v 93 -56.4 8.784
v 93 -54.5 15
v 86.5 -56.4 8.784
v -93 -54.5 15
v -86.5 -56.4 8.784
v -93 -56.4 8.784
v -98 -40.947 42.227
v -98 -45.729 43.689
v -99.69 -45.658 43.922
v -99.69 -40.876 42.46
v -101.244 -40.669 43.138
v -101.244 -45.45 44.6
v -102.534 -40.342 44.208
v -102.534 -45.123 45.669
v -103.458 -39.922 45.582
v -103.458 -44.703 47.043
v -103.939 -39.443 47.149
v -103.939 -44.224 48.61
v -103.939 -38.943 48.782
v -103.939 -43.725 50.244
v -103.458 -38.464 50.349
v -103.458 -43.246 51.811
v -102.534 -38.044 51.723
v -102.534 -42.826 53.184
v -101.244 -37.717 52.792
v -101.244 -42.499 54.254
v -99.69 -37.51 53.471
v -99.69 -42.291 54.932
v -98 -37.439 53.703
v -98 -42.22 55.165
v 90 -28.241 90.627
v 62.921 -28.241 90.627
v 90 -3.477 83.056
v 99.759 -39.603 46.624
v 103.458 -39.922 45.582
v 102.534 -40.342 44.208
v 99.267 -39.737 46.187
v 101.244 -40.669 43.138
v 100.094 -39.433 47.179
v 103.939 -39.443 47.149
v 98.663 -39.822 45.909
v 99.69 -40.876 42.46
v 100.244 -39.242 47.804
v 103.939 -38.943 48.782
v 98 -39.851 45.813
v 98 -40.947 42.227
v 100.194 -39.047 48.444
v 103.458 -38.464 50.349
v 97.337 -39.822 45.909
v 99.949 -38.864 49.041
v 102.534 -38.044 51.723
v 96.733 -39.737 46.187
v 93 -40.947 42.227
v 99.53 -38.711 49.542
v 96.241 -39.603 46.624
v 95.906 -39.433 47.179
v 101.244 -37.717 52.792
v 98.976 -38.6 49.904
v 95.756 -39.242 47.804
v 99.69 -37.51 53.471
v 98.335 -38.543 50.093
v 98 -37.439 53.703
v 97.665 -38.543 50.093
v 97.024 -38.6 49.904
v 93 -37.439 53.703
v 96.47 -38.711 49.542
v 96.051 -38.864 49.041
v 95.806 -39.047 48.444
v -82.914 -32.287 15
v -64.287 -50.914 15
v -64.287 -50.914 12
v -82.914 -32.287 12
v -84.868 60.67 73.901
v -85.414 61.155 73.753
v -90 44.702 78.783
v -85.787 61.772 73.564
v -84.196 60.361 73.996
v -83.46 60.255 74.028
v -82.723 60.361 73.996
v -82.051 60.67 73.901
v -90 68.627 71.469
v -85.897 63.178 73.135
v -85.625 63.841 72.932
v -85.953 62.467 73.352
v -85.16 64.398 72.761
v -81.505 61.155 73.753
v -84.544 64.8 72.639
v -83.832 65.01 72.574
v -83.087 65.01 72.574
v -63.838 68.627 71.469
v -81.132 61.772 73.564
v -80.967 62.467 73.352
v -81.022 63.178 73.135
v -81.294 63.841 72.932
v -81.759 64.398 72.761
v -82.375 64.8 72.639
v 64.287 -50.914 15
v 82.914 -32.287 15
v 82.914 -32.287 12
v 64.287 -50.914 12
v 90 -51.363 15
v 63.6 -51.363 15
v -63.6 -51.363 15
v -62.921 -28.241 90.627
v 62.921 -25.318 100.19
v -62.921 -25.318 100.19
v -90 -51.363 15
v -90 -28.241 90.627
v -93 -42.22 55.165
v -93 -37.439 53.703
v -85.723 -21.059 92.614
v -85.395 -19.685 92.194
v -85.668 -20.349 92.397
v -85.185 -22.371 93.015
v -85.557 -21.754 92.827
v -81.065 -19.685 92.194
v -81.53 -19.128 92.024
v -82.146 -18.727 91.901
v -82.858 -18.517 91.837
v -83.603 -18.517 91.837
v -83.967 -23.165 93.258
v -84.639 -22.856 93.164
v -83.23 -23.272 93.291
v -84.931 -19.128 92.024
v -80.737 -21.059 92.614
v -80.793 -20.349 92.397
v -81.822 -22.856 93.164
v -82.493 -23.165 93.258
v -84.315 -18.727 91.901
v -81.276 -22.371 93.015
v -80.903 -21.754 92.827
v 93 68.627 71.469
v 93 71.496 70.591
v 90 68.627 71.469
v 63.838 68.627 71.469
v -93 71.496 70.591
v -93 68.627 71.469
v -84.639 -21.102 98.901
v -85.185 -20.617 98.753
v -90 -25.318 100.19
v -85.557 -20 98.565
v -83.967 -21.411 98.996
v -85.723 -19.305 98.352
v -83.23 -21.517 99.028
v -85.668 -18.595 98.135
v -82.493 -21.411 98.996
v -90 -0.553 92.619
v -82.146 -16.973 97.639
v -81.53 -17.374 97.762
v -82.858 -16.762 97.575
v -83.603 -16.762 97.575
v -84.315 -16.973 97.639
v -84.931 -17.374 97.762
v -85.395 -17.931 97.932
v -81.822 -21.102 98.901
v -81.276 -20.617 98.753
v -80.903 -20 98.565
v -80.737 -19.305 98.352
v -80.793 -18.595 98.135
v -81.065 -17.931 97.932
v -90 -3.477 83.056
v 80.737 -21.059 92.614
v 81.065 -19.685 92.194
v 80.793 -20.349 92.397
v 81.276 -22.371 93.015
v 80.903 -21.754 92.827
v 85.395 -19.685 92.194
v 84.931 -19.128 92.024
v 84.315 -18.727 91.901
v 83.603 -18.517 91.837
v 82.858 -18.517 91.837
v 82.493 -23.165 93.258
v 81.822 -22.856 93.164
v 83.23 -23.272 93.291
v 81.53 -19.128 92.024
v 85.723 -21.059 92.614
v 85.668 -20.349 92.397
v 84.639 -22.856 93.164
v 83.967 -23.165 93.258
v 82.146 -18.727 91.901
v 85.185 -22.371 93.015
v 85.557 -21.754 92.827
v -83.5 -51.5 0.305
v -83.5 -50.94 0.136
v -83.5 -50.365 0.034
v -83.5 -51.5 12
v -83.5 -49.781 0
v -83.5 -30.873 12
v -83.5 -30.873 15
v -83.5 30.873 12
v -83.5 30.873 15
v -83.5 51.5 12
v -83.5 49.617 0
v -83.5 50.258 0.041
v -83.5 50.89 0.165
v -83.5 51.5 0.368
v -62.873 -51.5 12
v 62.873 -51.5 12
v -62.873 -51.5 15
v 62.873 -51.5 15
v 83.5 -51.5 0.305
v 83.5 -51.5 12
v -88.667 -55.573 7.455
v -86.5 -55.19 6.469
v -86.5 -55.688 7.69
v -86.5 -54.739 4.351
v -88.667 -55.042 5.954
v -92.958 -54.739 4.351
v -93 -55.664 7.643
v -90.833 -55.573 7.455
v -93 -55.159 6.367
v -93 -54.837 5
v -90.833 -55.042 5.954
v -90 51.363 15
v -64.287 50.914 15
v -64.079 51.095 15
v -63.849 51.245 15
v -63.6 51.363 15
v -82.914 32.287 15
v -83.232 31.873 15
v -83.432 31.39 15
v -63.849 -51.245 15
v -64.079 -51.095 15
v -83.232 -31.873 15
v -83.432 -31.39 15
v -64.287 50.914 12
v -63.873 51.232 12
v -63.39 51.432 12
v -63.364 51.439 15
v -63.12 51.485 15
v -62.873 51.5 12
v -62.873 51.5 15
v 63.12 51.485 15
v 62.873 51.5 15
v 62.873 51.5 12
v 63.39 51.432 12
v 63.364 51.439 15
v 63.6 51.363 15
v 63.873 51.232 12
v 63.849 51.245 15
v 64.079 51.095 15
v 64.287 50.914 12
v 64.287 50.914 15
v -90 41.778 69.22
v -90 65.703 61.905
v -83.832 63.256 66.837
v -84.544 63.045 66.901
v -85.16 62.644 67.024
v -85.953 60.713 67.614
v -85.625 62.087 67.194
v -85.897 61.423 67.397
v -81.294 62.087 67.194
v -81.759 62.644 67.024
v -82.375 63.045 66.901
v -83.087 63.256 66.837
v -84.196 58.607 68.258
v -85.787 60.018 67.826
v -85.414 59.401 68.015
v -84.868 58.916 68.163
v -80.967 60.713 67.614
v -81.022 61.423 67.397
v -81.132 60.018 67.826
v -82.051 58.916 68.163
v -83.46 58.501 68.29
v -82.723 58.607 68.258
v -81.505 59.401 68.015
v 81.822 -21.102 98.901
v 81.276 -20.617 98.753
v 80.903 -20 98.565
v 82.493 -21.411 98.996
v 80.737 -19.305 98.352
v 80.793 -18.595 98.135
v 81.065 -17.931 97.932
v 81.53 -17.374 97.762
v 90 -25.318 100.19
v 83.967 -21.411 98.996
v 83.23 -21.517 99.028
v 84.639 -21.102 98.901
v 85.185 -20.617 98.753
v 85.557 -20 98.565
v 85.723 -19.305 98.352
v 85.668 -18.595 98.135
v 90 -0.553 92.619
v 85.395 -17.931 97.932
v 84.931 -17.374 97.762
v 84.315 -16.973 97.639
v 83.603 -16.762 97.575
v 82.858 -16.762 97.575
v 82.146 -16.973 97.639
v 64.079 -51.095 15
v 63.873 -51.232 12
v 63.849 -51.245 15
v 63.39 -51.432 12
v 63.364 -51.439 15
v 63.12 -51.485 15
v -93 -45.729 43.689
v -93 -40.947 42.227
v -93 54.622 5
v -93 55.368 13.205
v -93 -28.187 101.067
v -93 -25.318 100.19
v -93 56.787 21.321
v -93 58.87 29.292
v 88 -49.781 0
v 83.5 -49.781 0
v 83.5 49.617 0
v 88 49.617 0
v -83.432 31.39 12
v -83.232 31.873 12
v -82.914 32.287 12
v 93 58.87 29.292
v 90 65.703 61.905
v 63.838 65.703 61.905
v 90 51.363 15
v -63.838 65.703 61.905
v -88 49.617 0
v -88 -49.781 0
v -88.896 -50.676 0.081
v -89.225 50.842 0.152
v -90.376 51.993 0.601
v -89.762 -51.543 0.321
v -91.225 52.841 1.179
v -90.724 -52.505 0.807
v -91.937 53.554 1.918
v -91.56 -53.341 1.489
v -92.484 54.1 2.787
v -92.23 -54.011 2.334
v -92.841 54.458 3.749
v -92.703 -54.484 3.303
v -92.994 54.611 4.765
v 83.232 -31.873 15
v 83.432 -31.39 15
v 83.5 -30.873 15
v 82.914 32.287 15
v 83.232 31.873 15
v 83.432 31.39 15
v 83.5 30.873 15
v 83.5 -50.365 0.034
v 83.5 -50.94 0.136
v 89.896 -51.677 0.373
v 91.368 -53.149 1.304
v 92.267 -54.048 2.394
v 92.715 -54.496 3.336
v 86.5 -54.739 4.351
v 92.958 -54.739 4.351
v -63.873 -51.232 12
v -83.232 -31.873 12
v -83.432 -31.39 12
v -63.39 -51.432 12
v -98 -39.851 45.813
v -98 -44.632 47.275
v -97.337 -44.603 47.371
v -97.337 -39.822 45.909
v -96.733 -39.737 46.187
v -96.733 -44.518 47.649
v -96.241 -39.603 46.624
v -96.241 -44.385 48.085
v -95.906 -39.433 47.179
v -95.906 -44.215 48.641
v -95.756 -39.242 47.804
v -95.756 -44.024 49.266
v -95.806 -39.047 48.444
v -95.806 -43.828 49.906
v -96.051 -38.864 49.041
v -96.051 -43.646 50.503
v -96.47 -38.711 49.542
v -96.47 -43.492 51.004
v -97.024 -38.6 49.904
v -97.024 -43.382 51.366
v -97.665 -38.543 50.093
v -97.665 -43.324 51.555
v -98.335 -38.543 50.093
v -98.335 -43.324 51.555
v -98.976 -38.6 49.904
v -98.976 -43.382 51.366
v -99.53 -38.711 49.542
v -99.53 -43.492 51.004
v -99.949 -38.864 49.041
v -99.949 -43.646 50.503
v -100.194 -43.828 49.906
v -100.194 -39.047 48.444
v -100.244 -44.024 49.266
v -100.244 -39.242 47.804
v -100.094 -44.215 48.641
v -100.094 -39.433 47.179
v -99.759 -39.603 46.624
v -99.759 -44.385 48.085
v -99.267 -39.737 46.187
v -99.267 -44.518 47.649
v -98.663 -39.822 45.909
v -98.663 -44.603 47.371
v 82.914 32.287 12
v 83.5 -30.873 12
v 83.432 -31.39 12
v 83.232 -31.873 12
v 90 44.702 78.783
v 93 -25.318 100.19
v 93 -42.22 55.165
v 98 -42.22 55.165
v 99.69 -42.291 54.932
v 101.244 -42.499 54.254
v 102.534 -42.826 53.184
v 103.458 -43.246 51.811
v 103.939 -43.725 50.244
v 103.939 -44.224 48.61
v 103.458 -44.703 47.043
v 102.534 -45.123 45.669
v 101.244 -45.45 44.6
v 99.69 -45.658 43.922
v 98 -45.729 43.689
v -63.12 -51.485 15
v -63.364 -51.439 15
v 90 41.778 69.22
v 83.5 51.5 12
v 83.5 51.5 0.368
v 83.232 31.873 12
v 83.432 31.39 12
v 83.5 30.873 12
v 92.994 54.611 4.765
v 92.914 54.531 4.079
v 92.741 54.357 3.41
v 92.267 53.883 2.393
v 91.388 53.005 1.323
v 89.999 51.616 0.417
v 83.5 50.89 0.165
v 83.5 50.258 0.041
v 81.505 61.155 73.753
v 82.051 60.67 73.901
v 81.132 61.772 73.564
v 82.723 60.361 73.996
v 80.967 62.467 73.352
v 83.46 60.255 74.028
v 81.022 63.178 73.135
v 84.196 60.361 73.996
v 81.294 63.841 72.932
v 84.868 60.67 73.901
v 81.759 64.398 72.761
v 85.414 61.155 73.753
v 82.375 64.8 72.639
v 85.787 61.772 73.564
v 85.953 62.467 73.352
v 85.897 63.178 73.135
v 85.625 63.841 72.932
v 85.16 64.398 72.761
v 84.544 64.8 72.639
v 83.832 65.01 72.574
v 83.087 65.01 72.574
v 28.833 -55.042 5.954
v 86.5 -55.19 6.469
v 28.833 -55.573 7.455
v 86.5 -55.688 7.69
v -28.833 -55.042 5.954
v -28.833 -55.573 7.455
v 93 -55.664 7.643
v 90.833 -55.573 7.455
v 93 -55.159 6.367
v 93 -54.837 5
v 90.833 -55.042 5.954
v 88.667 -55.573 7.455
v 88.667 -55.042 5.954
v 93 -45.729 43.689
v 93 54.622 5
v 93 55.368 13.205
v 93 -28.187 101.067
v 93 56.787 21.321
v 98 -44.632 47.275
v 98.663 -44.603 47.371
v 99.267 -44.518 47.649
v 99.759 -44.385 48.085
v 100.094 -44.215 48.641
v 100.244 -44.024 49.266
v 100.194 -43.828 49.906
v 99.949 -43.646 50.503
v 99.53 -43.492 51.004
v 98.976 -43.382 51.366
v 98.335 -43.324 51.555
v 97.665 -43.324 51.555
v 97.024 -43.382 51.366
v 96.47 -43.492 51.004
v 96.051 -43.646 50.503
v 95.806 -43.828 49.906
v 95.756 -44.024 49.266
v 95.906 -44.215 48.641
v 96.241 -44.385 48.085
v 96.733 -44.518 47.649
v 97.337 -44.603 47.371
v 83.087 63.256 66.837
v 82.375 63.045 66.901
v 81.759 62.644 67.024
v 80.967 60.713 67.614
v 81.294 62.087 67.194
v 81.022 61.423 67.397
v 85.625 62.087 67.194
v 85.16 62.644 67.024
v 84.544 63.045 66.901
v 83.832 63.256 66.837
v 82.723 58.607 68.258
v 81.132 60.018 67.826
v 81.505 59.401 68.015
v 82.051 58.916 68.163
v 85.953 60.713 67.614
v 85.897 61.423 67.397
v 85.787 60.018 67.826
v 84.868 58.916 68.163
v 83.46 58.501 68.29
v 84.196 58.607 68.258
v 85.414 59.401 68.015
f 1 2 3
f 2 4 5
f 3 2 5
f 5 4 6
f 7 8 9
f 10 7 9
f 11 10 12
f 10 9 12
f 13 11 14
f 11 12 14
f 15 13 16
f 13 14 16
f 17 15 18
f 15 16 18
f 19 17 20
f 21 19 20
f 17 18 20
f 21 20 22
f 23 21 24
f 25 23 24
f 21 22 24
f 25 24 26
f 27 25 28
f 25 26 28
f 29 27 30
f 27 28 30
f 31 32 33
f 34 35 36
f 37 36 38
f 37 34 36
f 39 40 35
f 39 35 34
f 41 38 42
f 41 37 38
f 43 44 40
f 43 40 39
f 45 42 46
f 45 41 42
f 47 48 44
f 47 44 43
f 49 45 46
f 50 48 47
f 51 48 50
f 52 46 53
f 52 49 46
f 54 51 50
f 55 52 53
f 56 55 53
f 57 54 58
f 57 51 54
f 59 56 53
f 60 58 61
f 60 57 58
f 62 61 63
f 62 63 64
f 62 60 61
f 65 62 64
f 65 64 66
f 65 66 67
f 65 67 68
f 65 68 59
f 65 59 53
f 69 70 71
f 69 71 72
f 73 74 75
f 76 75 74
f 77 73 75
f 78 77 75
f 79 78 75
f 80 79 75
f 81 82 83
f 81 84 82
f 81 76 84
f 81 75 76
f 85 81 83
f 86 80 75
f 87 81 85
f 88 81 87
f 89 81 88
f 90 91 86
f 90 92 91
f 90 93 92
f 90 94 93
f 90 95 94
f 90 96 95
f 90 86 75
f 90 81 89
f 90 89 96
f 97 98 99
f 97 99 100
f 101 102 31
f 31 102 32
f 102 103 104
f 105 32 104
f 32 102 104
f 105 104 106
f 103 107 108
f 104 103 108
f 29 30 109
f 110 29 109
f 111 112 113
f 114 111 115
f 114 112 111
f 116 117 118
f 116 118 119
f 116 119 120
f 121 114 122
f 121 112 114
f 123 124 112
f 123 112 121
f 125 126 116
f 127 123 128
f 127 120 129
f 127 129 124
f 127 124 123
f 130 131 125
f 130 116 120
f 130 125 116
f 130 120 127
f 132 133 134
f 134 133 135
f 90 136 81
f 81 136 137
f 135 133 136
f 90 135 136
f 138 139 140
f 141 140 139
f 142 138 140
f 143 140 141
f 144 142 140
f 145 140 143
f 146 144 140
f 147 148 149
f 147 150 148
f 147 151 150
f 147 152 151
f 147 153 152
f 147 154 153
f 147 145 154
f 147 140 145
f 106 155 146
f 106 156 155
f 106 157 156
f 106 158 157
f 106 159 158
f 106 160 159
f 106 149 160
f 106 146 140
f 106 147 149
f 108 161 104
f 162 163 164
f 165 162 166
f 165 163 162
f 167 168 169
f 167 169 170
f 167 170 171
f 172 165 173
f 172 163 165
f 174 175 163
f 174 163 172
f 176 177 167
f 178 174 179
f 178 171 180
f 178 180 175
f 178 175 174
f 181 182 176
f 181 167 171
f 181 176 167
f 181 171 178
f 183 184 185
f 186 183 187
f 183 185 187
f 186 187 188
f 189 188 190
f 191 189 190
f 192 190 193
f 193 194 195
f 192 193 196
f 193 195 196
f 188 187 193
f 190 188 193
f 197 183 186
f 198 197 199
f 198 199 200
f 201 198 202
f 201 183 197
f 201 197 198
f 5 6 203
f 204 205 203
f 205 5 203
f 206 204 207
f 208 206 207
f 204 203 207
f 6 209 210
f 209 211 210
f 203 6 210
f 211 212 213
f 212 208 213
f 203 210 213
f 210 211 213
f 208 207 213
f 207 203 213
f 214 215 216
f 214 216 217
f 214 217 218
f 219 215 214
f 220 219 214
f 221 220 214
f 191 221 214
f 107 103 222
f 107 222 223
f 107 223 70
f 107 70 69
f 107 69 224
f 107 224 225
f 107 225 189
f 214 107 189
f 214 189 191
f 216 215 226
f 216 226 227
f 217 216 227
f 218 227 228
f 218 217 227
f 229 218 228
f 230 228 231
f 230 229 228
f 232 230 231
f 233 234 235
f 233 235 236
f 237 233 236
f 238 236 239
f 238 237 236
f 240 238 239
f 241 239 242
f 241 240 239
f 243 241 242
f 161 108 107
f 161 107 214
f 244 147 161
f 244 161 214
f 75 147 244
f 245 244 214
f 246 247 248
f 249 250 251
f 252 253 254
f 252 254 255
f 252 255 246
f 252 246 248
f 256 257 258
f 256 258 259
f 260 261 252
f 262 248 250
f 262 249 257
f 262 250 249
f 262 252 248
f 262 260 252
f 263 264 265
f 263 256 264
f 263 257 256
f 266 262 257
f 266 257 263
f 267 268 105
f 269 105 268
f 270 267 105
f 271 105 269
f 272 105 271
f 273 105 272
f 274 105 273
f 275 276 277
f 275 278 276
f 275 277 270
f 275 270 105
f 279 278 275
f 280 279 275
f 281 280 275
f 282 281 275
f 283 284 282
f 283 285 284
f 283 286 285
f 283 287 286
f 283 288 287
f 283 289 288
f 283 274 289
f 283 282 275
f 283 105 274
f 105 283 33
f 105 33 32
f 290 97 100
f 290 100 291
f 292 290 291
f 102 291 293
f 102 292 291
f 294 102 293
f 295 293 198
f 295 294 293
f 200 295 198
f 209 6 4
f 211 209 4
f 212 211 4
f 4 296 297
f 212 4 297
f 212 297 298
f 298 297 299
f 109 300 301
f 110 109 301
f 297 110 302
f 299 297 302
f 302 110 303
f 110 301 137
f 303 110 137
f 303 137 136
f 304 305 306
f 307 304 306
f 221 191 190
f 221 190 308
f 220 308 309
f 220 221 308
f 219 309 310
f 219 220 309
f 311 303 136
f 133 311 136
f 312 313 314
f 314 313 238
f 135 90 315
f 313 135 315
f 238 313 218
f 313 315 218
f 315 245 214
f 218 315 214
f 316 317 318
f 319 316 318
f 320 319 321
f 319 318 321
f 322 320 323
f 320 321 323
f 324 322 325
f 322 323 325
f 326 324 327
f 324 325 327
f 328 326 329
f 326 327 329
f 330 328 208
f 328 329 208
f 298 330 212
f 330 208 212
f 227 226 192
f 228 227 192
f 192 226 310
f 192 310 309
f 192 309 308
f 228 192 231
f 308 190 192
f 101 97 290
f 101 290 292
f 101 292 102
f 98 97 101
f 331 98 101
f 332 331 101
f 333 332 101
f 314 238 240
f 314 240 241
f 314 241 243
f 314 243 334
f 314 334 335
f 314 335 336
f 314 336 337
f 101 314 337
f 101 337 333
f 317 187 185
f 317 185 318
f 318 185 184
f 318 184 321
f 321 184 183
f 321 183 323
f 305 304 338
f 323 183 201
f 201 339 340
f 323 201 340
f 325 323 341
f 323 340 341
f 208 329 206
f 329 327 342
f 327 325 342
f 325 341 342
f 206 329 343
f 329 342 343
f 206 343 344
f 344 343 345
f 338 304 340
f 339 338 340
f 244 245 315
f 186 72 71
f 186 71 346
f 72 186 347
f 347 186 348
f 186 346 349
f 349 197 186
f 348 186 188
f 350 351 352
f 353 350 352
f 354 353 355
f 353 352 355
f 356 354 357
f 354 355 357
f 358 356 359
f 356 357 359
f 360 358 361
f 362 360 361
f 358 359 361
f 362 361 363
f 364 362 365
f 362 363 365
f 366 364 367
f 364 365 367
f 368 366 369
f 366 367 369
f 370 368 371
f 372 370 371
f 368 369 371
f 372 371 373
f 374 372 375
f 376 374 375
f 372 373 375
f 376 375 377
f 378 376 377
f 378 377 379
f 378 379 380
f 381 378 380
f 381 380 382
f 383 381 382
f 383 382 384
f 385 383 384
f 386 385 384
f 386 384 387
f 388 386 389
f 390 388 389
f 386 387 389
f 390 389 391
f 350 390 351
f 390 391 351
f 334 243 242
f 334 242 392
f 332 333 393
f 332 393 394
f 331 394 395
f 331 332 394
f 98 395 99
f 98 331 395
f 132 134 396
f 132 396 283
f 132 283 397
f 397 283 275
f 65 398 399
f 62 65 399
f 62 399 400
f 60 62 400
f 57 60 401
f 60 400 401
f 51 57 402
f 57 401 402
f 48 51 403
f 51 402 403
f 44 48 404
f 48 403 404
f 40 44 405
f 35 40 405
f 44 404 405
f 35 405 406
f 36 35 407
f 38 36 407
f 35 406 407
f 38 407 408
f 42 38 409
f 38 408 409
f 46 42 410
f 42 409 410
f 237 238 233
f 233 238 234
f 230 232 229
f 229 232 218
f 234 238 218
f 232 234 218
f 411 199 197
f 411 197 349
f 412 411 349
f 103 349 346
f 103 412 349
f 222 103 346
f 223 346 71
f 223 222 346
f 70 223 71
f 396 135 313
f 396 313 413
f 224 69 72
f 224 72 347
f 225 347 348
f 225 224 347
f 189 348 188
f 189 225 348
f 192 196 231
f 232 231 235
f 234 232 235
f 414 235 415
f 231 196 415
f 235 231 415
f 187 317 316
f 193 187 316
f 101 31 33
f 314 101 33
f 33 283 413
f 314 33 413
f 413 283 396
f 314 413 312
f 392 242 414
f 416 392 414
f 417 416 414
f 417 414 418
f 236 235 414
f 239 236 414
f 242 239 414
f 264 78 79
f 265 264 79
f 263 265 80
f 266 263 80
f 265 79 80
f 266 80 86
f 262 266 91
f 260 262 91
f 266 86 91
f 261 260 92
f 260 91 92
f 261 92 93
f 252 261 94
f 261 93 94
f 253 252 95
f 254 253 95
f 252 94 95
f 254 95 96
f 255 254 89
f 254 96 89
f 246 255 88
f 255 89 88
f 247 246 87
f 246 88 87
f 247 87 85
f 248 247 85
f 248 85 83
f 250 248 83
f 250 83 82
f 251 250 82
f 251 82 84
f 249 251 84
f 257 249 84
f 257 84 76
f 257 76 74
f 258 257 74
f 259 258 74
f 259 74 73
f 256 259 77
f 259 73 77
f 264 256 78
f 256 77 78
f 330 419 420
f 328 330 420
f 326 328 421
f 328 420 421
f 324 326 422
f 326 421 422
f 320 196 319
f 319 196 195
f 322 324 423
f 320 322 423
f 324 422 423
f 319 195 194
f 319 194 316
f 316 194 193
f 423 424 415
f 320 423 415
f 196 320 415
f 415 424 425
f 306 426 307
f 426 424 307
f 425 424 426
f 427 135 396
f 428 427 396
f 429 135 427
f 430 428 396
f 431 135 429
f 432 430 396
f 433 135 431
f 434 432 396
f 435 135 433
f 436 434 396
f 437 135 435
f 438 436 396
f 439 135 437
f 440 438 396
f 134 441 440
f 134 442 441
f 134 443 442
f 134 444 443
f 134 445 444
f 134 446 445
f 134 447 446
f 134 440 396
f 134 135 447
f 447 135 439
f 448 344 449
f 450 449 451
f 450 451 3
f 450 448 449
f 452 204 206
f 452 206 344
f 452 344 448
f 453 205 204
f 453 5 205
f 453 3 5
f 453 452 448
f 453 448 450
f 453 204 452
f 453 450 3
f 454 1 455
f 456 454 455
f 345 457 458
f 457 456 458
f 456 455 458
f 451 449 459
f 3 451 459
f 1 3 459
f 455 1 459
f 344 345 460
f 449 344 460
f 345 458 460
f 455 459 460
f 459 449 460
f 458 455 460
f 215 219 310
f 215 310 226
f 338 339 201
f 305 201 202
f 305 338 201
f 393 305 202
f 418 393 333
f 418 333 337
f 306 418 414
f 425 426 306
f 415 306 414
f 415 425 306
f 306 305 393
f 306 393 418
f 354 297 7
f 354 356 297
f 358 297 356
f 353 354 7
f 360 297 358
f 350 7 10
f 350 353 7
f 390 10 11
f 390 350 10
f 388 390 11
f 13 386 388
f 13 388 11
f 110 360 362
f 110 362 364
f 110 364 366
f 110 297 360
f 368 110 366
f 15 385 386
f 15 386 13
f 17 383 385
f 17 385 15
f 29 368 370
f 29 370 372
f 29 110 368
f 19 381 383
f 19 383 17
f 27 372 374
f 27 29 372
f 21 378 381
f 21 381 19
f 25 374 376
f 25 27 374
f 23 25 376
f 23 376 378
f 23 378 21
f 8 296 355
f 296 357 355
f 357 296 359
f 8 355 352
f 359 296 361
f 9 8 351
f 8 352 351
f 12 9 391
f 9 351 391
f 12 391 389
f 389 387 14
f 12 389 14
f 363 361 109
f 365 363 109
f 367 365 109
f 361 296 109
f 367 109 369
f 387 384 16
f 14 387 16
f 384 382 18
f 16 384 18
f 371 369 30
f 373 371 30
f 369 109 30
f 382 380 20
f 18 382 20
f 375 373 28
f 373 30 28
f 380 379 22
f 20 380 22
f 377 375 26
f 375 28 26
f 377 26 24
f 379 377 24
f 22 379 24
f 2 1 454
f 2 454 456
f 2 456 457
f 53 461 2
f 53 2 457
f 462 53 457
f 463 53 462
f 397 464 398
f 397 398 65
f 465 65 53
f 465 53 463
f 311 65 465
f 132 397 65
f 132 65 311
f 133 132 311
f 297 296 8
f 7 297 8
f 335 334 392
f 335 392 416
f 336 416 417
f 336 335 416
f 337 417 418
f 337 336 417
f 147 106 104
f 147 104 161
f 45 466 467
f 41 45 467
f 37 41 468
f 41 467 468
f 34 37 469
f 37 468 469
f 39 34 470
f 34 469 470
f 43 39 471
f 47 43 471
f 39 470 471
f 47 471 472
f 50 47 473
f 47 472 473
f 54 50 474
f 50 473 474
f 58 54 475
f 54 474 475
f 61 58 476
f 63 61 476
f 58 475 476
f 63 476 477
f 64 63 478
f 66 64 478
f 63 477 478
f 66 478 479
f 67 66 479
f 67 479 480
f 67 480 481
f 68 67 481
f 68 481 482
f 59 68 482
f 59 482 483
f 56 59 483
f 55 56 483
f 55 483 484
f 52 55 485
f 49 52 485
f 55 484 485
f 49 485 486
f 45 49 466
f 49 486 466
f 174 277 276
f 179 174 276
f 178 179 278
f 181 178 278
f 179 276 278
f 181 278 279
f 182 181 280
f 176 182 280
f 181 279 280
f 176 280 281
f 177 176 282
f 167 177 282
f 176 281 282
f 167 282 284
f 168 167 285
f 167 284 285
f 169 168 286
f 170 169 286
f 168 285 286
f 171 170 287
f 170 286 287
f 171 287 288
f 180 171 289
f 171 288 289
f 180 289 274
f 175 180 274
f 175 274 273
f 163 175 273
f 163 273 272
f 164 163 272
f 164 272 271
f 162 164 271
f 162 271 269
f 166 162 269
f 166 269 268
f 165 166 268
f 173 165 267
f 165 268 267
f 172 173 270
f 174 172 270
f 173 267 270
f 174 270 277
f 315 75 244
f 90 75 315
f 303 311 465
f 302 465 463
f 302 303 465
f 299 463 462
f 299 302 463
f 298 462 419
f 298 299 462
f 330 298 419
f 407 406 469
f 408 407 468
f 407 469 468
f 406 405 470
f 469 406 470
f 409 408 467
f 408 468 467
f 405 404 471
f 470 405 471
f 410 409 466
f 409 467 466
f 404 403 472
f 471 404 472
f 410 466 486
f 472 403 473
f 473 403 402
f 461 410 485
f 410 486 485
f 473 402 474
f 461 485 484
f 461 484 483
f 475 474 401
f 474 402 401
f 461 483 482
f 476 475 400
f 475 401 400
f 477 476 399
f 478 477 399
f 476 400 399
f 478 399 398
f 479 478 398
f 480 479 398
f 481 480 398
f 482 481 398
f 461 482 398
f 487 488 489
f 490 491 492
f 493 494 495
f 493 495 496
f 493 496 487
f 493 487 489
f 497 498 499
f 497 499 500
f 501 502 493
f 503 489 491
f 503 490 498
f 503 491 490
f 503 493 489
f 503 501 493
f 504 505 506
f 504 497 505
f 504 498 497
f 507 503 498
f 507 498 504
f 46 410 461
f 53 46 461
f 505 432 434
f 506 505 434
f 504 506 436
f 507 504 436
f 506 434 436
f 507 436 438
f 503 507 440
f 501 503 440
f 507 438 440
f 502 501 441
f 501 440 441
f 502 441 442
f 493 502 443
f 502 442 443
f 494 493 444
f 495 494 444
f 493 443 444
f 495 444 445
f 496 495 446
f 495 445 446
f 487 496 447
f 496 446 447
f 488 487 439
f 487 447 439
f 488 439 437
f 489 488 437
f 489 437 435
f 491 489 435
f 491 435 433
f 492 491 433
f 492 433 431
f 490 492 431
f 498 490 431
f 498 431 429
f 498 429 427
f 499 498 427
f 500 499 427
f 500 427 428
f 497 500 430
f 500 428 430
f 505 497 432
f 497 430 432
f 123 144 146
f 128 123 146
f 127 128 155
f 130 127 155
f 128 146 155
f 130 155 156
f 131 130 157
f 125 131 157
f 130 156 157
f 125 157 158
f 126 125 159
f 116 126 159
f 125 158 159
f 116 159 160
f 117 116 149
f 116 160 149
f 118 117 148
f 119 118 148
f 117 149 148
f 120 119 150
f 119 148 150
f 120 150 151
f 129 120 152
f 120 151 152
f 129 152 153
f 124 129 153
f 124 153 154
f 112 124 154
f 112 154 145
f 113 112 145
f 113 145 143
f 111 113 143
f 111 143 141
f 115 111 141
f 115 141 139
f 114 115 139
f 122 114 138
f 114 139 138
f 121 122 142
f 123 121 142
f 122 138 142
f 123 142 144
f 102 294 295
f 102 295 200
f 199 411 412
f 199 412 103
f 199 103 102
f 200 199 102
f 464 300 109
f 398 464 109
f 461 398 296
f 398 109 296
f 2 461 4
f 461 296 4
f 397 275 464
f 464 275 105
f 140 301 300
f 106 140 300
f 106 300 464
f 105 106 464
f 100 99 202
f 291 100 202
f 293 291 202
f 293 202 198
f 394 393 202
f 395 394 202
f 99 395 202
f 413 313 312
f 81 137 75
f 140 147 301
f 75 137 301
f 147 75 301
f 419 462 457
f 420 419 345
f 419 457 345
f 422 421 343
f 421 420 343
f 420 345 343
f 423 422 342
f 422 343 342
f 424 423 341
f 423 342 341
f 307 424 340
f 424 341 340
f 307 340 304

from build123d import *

# Parameters (mm, degrees)
SKETCH1_W                = 173
SKETCH1_H                = 109
SKETCH1_W_2              = 167
SKETCH1_H_2              = 103
EXTRUDE_THIN1_DEPTH      = 15
BOSS_EXTRUDE1_DEPTH      = 3
BOSS_EXTRUDE2_DEPTH      = 86.5
BOSS_EXTRUDE2_DEPTH_BACK = 86.5
MOVE_START               = 86.5
MOVE_FACE1_DEPTH         = 6.5
MOVE_START_2             = -93
MOVE_FACE2_DEPTH         = 6.5
BOSS_EXTRUDE3_START      = -93
BOSS_EXTRUDE3_DEPTH      = 186
BOSS_EXTRUDE3_2_DEPTH    = 3
BOSS_EXTRUDE3_START_2    = 90
BOSS_EXTRUDE3_3_DEPTH    = 3
FILLET3_R                = 100
FILLET2_R                = 2
SKETCH8_R                = 2.5
BOSS_EXTRUDE4_DEPTH      = 10
SKETCH8_3_R              = 2.5
CUT_EXTRUDE1_DEPTH       = 6
SKETCH9_R                = 2.25
BOSS_EXTRUDE5_DEPTH      = 5
FILLET4_R                = 5


# Read off the part's stored shape, not the designer's step: Move Face1, Move Face2, Boss-Extrude3
with BuildPart() as part:
    # Sketch1 → Extrude-Thin1 (new body)
    with BuildSketch(Plane.XY):
        Rectangle(SKETCH1_W, SKETCH1_H)
        Rectangle(SKETCH1_W_2, SKETCH1_H_2, mode=Mode.SUBTRACT)
    extrude(amount=EXTRUDE_THIN1_DEPTH)

    # Sketch2 → Boss-Extrude1 (add)
    with BuildSketch(Plane.XY.offset(15)):
        Polygon((63.701010127, 51.5), (83.5, 31.701010127), (83.5, 51.5), align=None)
        Polygon((-83.5, 51.5), (-83.5, 31.701010127), (-63.701010127, 51.5), align=None)
        Polygon((83.5, -31.701010127), (63.701010127, -51.5), (83.5, -51.5), align=None)
        Polygon((-83.5, -31.701010127), (-83.5, -51.5), (-63.701010127, -51.5), align=None)
    extrude(amount=-BOSS_EXTRUDE1_DEPTH)

    # Sketch5 → Boss-Extrude2 (add, two sides: drawn at the far end of the back side and taken through both)
    with BuildSketch(Plane(origin=(0, 0, 0), x_dir=(0, 0, -1), z_dir=(1, 0, 0)).offset(-BOSS_EXTRUDE2_DEPTH_BACK)):
        with BuildLine():
            Line((-15, -54.5), (-8.784019086, -56.400416081))
            add(Edge.make_bspline(
                [(0, -54.5), (-2.80635361, -54.592909142), (-6.451217818, -54.49036495), (-8.784019086, -56.400416081)],
                knots=[0, 0, 0, 0, 1, 1, 1, 1], degree=3))
            Line((0, -54.5), (-15, -54.5))
        make_face()
    extrude(amount=BOSS_EXTRUDE2_DEPTH + BOSS_EXTRUDE2_DEPTH_BACK)

    # Move Face1 outline → Move Face1 (add)
    with BuildSketch(Plane.YZ.offset(MOVE_START)):
        with BuildLine():
            Line((-54.5, 15), (-56.400416081, 8.784019086))
            add(Edge.make_bspline(
                [(-56.400416081, 8.784019086), (-54.49036495, 6.451217818), (-54.592909142, 2.80635361), (-54.5, 0)],
                knots=[0, 0, 0, 0, 1, 1, 1, 1], degree=3))
            Line((-54.5, 0), (54.5, 0))
            Line((54.5, 0), (54.5, 15))
            Line((54.5, 15), (-54.5, 15))
        make_face()
    extrude(amount=MOVE_FACE1_DEPTH)

    # Move Face2 outline → Move Face2 (add)
    with BuildSketch(Plane.YZ.offset(MOVE_START_2)):
        with BuildLine():
            Line((-54.5, 15), (-56.400416081, 8.784019086))
            add(Edge.make_bspline(
                [(-56.400416081, 8.784019086), (-54.49036495, 6.451217818), (-54.592909142, 2.80635361), (-54.5, 0)],
                knots=[0, 0, 0, 0, 1, 1, 1, 1], degree=3))
            Line((-54.5, 0), (54.5, 0))
            Line((54.5, 0), (54.5, 15))
            Line((54.5, 15), (-54.5, 15))
        make_face()
    extrude(amount=MOVE_FACE2_DEPTH)

    # Boss-Extrude3 outline → Boss-Extrude3 (add)
    with BuildSketch(Plane.YZ.offset(BOSS_EXTRUDE3_START)):
        Polygon((-28.186546575, 101.067428037), (-54.5, 15), (-51.362924731, 15), (-25.317632307, 100.190312923), align=None)
        Polygon((71.496001129, 70.591414798), (68.627086861, 71.468529912), (51.362924731, 15), (54.5, 15), align=None)
    extrude(amount=BOSS_EXTRUDE3_DEPTH)

    # Boss-Extrude3 2 outline → Boss-Extrude3 2 (add)
    with BuildSketch(Plane.YZ.offset(BOSS_EXTRUDE3_START)):
        Polygon((68.627086861, 71.468529912), (-25.317632307, 100.190312923), (-51.362924731, 15), (51.362924731, 15), align=None)
    extrude(amount=BOSS_EXTRUDE3_2_DEPTH)

    # Boss-Extrude3 3 outline → Boss-Extrude3 3 (add)
    with BuildSketch(Plane.YZ.offset(BOSS_EXTRUDE3_START_2)):
        Polygon((68.627086861, 71.468529912), (-25.317632307, 100.190312923), (-51.362924731, 15), (51.362924731, 15), align=None)
    extrude(amount=BOSS_EXTRUDE3_3_DEPTH)

    # Fillet3
    fillet3_edges = [part.edges().sort_by_distance(p)[0] for p in [
        (0, 54.5, 15),
    ]]
    fillet(fillet3_edges, radius=FILLET3_R)

    # Fillet2
    # the kernel refuses this fillet: 2 mm, written as the material it adds along each edge
    with BuildSketch(Plane(origin=(83.5, 31.701010127, 15), x_dir=(0, -1, 0), z_dir=(0, 0, -1)), Plane(origin=(-63.701010127, 51.5, 15), x_dir=(1, 0, 0), z_dir=(0, 0, -1)), Plane(origin=(63.701010127, -51.5, 15), x_dir=(-1, 0, 0), z_dir=(0, 0, -1)), Plane(origin=(-83.5, -31.701010127, 15), x_dir=(0, 1, 0), z_dir=(0, 0, -1))) as fillet2_piece_1:
        with BuildLine():
            CenterArc((FILLET2_R * 0.414213562373, FILLET2_R), FILLET2_R, 225, 45)
            Line((-FILLET2_R * 0.292893218813, FILLET2_R * 0.292893218813), (0, 0))
            Line((0, 0), (FILLET2_R * 0.414213562373, 0))
        make_face()
    extrude(amount=3)
    with BuildSketch(Plane(origin=(63.701010127, 51.5, 15), x_dir=(-1, 0, 0), z_dir=(0, 0, -1)), Plane(origin=(-83.5, 31.701010127, 15), x_dir=(0, -1, 0), z_dir=(0, 0, -1)), Plane(origin=(83.5, -31.701010127, 15), x_dir=(0, 1, 0), z_dir=(0, 0, -1)), Plane(origin=(-63.701010127, -51.5, 15), x_dir=(1, 0, 0), z_dir=(0, 0, -1))) as fillet2_piece_2:
        with BuildLine():
            CenterArc((FILLET2_R * 0.414213562373, -FILLET2_R), FILLET2_R, 90, 45)
            Line((-FILLET2_R * 0.292893218813, -FILLET2_R * 0.292893218813), (0, 0))
            Line((0, 0), (FILLET2_R * 0.414213562373, 0))
        make_face()
    extrude(amount=3)

    # Sketch8 → Boss-Extrude4 (add)
    # profile 1 of 8: a face of its own
    with BuildSketch(Plane(origin=(0, 25.848674053, 84.547203211), x_dir=(1, 0, 0), z_dir=(0, 0.2923717047227412, 0.9563047559630341))):
        Polygon((-90, 19.714270268), (-63.838085396, 44.733033629), (-90, 44.733033629), align=None)
        with Locations((-83.459521349, 38.478342789)):
            Circle(SKETCH8_R, mode=Mode.SUBTRACT)
    # profile 2 of 8: a face of its own
    with BuildSketch(Plane(origin=(0, 25.848674053, 84.547203211), x_dir=(1, 0, 0), z_dir=(0, 0.2923717047227412, 0.9563047559630341))):
        with Locations((-83.459521349, 38.478342789)):
            Circle(SKETCH8_R)
    # profile 3 of 8: a face of its own
    with BuildSketch(Plane(origin=(0, 25.848674053, 84.547203211), x_dir=(1, 0, 0), z_dir=(0, 0.2923717047227412, 0.9563047559630341))):
        Polygon((62.943139485, -53.504184771), (90, -53.504184771), (90, -27.608306296), (62.920893352, -53.504184771), align=None)
        with Locations((83.230223338, -47.030215152)):
            Circle(SKETCH8_R, mode=Mode.SUBTRACT)
    # profile 4 of 8: a face of its own
    with BuildSketch(Plane(origin=(0, 25.848674053, 84.547203211), x_dir=(1, 0, 0), z_dir=(0, 0.2923717047227412, 0.9563047559630341))):
        with Locations((83.230223338, -47.030215152)):
            Circle(SKETCH8_R)
    # profile 5 of 8: a face of its own
    with BuildSketch(Plane(origin=(0, 25.848674053, 84.547203211), x_dir=(1, 0, 0), z_dir=(0, 0.2923717047227412, 0.9563047559630341))):
        Polygon((-90, -53.504184771), (-62.920893352, -53.504184771), (-90, -27.608306296), align=None)
        with Locations((-83.230223338, -47.030215152)):
            Circle(SKETCH8_R, mode=Mode.SUBTRACT)
    # profile 6 of 8: a face of its own
    with BuildSketch(Plane(origin=(0, 25.848674053, 84.547203211), x_dir=(1, 0, 0), z_dir=(0, 0.2923717047227412, 0.9563047559630341))):
        with Locations((-83.230223338, -47.030215152)):
            Circle(SKETCH8_R)
    # profile 7 of 8: a face of its own
    with BuildSketch(Plane(origin=(0, 25.848674053, 84.547203211), x_dir=(1, 0, 0), z_dir=(0, 0.2923717047227412, 0.9563047559630341))):
        Polygon((63.838085396, 44.733033629), (90, 19.714270268), (90, 44.733033629), align=None)
        with Locations((83.459521349, 38.478342789)):
            Circle(SKETCH8_R, mode=Mode.SUBTRACT)
    # profile 8 of 8: a face of its own
    with BuildSketch(Plane(origin=(0, 25.848674053, 84.547203211), x_dir=(1, 0, 0), z_dir=(0, 0.2923717047227412, 0.9563047559630341))):
        with Locations((83.459521349, 38.478342789)):
            Circle(SKETCH8_R)
    extrude(amount=-BOSS_EXTRUDE4_DEPTH)

    # Sketch8<3> → Cut-Extrude1 (cut)
    with BuildSketch(Plane(origin=(0, 25.848674053, 84.547203211), x_dir=(1, 0, 0), z_dir=(0, 0.2923717047227412, 0.9563047559630341))):
        with Locations(Location((-83.459521349, 38.478342789, 0), (0, 0, 270))):
            Circle(SKETCH8_3_R)
        with Locations(Location((83.459521349, 38.478342789, 0), (0, 0, 270))):
            Circle(SKETCH8_3_R)
        with Locations(Location((-83.230223338, -47.030215152, 0), (0, 0, 270))):
            Circle(SKETCH8_3_R)
        with Locations(Location((83.230223338, -47.030215152, 0), (0, 0, 270))):
            Circle(SKETCH8_3_R)
    extrude(amount=-CUT_EXTRUDE1_DEPTH, mode=Mode.SUBTRACT)

    # Sketch9 → Boss-Extrude5 (add)
    # profile 1 of 2: a face of its own
    with BuildSketch(Plane(origin=(0, -54.035220628, 16.520224825), x_dir=(1, 0, 0), z_dir=(0, -0.956304755963037, 0.29237170472273216))):
        with BuildLine():
            Line((-98, 40.410313432), (-93, 40.410313432))
            Line((-93, 40.410313432), (-93, 28.410313432))
            Line((-93, 28.410313432), (-98, 28.410313432))
            ThreePointArc((-98, 28.410313432), (-104, 34.410313432), (-98, 40.410313432))
        make_face()
        with Locations(Location((-98, 34.410313432, 0), (0, 0, 270))):
            Circle(SKETCH9_R, mode=Mode.SUBTRACT)
    # profile 2 of 2: a face of its own
    with BuildSketch(Plane(origin=(0, -54.035220628, 16.520224825), x_dir=(1, 0, 0), z_dir=(0, -0.956304755963037, 0.29237170472273216))):
        with BuildLine():
            Line((93, 40.410313432), (98, 40.410313432))
            ThreePointArc((98, 40.410313432), (104, 34.410313432), (98, 28.410313432))
            Line((98, 28.410313432), (93, 28.410313432))
            Line((93, 28.410313432), (93, 40.410313432))
        make_face()
        with Locations(Location((98, 34.410313432, 0), (0, 0, 270))):
            Circle(SKETCH9_R, mode=Mode.SUBTRACT)
    extrude(amount=-BOSS_EXTRUDE5_DEPTH)

    # Fillet4
    # the kernel refuses this fillet: 5 mm, written as the material it takes off along each edge
    with BuildSketch(Plane(origin=(-93, -67, 0), x_dir=(1, 0, 0), z_dir=(0, 1, 0))) as fillet4_piece_1:
        with BuildLine():
            CenterArc((FILLET4_R, -FILLET4_R), FILLET4_R, 90, 90)
            Line((0, -FILLET4_R), (-FILLET4_R * 0.02, -FILLET4_R))
            Line((-FILLET4_R * 0.02, -FILLET4_R), (-FILLET4_R * 0.02, FILLET4_R * 0.02))
            Line((-FILLET4_R * 0.02, FILLET4_R * 0.02), (FILLET4_R, FILLET4_R * 0.02))
            Line((FILLET4_R, FILLET4_R * 0.02), (FILLET4_R, 0))
        make_face()
    extrude(amount=134, mode=Mode.SUBTRACT)
    with BuildSketch(Plane(origin=(86.5, -54.5, 0), x_dir=(0, 1, 0), z_dir=(-1, 0, 0)), Plane(origin=(0, -54.5, 0), x_dir=(0, 1, 0), z_dir=(-1, 0, 0))) as fillet4_piece_2:
        with BuildLine():
            CenterArc((4.719023174, -5), FILLET4_R, 90, 82.540825882)
            Line((-0.238664904, -4.350901455), (-0.337818666, -4.337919484))
            ThreePointArc((-0.337818666, -4.337919484), (-0.165294679, -2.173525325), (-0.099945242, 0.003308858))
            Line((-0.099945242, 0.003308858), (0, 0.1))
            Line((0, 0.1), (4.719023174, 0.1))
            Line((4.719023174, 0.1), (4.719023174, 0))
        make_face()
    extrude(amount=86.5, mode=Mode.SUBTRACT)
    with BuildSketch(Plane(origin=(105.208719161, 54.5, 0), x_dir=(0, -1, 0), z_dir=(-1, 0, 0))) as fillet4_piece_3:
        with BuildLine():
            CenterArc((4.883487664, 5), FILLET4_R, 182.699411552, 87.300588448)
            Line((-0.110964129, 4.764519041), (-0.610409308, 4.740970945))
            ThreePointArc((-0.610409308, 4.740970945), (-0.5, 0.054899865), (-0.5, 0))
            Line((-0.5, 0), (0, -0.5))
            Line((0, -0.5), (4.883487664, -0.5))
            Line((4.883487664, -0.5), (4.883487664, 0))
        make_face()
    extrude(amount=210.417438322, mode=Mode.SUBTRACT)
    with BuildSketch(Plane(origin=(93, -67, 0), x_dir=(-1, 0, 0), z_dir=(0, 1, 0))) as fillet4_piece_4:
        with BuildLine():
            CenterArc((FILLET4_R, FILLET4_R), FILLET4_R, 180, 90)
            Line((0, FILLET4_R), (-FILLET4_R * 0.02, FILLET4_R))
            Line((-FILLET4_R * 0.02, FILLET4_R), (-FILLET4_R * 0.02, -FILLET4_R * 0.02))
            Line((-FILLET4_R * 0.02, -FILLET4_R * 0.02), (FILLET4_R, -FILLET4_R * 0.02))
            Line((FILLET4_R, -FILLET4_R * 0.02), (FILLET4_R, 0))
        make_face()
    extrude(amount=134, mode=Mode.SUBTRACT)
    with BuildSketch(Plane(origin=(86.5, -54.5, 0), x_dir=(0, 1, 0), z_dir=(1, 0, 0)), Plane(origin=(-104.797557934, -54.5, 0), x_dir=(0, 1, 0), z_dir=(1, 0, 0))) as fillet4_piece_5:
        with BuildLine():
            CenterArc((4.719023174, 5), FILLET4_R, 187.459174119, 82.540825881)
            Line((-0.238664904, 4.350901455), (-0.337818666, 4.337919484))
            ThreePointArc((-0.337818666, 4.337919484), (-0.165294679, 2.173525325), (-0.099945242, -0.003308858))
            Line((-0.099945242, -0.003308858), (0, -0.1))
            Line((0, -0.1), (4.719023174, -0.1))
            Line((4.719023174, -0.1), (4.719023174, 0))
        make_face()
    extrude(amount=18.297557934, mode=Mode.SUBTRACT)


solid = part.part
